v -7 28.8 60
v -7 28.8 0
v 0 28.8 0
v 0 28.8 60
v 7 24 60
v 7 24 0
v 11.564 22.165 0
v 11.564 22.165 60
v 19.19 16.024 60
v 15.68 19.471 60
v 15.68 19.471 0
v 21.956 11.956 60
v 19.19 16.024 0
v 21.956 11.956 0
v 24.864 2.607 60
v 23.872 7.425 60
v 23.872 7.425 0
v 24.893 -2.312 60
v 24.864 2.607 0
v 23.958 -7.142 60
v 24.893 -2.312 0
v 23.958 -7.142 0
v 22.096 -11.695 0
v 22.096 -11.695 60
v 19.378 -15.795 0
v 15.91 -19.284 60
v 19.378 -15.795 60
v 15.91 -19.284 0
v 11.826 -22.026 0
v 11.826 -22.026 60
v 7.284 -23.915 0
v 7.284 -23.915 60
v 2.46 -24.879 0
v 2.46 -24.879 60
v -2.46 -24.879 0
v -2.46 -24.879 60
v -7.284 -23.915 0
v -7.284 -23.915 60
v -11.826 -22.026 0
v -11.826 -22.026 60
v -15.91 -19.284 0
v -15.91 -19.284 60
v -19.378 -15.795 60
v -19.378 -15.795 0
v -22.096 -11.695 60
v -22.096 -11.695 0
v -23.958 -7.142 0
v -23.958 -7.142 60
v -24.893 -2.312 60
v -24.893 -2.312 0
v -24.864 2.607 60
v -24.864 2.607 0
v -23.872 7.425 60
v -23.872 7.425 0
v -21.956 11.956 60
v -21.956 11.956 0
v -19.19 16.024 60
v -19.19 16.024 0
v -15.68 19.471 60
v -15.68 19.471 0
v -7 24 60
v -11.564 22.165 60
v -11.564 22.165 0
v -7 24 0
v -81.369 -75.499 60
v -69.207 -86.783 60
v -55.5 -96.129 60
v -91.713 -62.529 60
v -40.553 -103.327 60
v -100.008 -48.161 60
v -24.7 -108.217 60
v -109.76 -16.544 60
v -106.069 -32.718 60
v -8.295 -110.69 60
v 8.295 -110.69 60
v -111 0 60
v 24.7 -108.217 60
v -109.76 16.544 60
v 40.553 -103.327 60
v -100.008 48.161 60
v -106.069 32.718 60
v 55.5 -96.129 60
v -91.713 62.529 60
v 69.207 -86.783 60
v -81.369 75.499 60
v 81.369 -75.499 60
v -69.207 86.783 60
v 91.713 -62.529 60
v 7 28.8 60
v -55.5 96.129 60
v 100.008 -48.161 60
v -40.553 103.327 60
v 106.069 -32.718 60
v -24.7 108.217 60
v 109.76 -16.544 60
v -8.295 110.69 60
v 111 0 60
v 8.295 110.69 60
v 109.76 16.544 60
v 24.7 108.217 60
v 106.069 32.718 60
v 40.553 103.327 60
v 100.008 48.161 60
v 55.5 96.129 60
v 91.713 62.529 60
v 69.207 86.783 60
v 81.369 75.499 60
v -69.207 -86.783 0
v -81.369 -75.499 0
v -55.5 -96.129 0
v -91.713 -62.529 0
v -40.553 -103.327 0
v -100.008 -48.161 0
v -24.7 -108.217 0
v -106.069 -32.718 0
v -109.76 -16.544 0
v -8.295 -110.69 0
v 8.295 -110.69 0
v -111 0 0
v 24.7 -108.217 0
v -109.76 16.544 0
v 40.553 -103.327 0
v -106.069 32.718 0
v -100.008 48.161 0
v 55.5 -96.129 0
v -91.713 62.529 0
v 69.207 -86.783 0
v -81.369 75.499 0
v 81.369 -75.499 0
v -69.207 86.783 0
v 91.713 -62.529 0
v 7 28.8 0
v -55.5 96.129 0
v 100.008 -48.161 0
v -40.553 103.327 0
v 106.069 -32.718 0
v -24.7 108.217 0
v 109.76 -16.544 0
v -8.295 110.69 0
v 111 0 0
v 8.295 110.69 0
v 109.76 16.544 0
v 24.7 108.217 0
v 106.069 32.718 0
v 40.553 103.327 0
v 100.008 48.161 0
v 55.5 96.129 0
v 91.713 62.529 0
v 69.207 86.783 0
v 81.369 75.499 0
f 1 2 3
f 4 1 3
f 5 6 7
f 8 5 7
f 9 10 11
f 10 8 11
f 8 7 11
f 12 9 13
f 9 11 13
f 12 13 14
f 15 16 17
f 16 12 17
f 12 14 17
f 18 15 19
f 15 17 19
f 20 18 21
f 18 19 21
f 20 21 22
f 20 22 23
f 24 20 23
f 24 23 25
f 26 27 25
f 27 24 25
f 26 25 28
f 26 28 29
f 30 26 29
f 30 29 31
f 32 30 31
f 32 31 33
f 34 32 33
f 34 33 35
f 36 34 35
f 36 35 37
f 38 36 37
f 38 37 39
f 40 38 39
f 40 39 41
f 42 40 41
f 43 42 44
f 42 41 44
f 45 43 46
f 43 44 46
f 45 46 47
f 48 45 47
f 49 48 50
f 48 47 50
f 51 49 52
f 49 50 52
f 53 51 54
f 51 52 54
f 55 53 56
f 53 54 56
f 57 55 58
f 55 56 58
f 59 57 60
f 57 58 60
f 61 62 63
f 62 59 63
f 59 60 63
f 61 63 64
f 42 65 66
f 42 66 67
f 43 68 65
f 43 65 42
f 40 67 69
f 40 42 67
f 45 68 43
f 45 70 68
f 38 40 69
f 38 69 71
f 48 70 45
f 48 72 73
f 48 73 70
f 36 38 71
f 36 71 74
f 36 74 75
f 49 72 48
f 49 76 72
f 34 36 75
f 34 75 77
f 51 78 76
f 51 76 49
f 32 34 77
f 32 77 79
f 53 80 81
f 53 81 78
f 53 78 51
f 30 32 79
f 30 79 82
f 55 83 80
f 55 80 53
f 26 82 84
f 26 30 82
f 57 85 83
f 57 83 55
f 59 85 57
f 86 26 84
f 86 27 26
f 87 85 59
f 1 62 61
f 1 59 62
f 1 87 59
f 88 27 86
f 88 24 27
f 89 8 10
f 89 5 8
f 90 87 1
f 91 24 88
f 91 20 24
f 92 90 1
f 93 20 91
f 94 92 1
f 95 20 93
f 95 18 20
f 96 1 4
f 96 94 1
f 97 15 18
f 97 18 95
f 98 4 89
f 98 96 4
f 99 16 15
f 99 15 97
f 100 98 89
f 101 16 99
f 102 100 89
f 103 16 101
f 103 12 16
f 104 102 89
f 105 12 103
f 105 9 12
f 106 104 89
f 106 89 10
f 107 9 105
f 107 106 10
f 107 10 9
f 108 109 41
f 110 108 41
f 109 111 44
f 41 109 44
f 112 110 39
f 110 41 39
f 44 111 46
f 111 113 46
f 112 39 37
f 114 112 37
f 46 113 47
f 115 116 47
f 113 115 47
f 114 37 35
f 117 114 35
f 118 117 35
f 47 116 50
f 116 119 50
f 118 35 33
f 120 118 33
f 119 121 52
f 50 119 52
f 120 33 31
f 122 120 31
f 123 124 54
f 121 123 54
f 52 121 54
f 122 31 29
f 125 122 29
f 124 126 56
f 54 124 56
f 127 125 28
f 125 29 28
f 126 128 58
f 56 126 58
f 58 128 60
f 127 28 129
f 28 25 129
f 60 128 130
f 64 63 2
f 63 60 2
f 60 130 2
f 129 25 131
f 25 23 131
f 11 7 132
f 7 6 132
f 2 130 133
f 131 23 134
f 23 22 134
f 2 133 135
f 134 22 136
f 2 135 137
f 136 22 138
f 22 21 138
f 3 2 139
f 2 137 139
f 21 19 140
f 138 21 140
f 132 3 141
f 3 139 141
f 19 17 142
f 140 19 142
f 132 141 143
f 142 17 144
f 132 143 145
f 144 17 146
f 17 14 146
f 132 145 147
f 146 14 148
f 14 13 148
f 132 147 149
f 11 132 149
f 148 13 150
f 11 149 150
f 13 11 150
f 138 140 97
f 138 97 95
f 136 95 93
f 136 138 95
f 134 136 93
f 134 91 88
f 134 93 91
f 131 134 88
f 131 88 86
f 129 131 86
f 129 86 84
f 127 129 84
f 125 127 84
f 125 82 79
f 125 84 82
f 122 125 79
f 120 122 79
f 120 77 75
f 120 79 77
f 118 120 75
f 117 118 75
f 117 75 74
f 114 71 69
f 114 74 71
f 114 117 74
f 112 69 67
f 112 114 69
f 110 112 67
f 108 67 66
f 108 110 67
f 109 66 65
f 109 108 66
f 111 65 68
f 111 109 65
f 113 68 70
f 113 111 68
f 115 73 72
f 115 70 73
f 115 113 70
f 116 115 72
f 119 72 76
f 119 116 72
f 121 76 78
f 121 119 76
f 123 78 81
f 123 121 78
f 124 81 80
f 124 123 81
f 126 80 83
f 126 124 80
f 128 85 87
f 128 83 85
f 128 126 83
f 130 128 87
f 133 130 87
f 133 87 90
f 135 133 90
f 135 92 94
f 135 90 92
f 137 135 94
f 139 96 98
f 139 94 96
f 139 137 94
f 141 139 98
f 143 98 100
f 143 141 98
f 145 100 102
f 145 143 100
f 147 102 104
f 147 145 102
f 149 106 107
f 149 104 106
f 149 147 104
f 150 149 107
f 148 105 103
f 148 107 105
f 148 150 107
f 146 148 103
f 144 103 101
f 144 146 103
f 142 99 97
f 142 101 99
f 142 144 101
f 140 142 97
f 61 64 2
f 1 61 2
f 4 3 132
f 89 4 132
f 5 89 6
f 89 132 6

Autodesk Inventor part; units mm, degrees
sketch "スケッチ1" plane through (0, 0, 0) normal (0, 0, 1) x (1, 0, 0)
  circle A0 centre (0, 0) radius 111
  arc A1 (-7, 24) -> (7, 24) centre (0, 0) ccw
  line L0 (0, 25) -> (0, 28.8)
  line L1 (0, 28.8) -> (0, 20)
  line L2 (0, 20) -> (-7, 20)
  line L3 (-7, 24) -> (-7, 28.8)
  line L4 (-7, 28.8) -> (7, 28.8)
  line L5 (7, 28.8) -> (7, 24)
  line L6 (7, 20) -> (0, 20)
  dimension "d0" = 222
  dimension "d1" = 50
  dimension "d2" = 3.8
  dimension "d3" = 8.8
  dimension "d4" = 7
  dimension "d5" = 14
extrude "押し出し1" add sketch "スケッチ1" along normal blind 60
properties part number "gear4"
